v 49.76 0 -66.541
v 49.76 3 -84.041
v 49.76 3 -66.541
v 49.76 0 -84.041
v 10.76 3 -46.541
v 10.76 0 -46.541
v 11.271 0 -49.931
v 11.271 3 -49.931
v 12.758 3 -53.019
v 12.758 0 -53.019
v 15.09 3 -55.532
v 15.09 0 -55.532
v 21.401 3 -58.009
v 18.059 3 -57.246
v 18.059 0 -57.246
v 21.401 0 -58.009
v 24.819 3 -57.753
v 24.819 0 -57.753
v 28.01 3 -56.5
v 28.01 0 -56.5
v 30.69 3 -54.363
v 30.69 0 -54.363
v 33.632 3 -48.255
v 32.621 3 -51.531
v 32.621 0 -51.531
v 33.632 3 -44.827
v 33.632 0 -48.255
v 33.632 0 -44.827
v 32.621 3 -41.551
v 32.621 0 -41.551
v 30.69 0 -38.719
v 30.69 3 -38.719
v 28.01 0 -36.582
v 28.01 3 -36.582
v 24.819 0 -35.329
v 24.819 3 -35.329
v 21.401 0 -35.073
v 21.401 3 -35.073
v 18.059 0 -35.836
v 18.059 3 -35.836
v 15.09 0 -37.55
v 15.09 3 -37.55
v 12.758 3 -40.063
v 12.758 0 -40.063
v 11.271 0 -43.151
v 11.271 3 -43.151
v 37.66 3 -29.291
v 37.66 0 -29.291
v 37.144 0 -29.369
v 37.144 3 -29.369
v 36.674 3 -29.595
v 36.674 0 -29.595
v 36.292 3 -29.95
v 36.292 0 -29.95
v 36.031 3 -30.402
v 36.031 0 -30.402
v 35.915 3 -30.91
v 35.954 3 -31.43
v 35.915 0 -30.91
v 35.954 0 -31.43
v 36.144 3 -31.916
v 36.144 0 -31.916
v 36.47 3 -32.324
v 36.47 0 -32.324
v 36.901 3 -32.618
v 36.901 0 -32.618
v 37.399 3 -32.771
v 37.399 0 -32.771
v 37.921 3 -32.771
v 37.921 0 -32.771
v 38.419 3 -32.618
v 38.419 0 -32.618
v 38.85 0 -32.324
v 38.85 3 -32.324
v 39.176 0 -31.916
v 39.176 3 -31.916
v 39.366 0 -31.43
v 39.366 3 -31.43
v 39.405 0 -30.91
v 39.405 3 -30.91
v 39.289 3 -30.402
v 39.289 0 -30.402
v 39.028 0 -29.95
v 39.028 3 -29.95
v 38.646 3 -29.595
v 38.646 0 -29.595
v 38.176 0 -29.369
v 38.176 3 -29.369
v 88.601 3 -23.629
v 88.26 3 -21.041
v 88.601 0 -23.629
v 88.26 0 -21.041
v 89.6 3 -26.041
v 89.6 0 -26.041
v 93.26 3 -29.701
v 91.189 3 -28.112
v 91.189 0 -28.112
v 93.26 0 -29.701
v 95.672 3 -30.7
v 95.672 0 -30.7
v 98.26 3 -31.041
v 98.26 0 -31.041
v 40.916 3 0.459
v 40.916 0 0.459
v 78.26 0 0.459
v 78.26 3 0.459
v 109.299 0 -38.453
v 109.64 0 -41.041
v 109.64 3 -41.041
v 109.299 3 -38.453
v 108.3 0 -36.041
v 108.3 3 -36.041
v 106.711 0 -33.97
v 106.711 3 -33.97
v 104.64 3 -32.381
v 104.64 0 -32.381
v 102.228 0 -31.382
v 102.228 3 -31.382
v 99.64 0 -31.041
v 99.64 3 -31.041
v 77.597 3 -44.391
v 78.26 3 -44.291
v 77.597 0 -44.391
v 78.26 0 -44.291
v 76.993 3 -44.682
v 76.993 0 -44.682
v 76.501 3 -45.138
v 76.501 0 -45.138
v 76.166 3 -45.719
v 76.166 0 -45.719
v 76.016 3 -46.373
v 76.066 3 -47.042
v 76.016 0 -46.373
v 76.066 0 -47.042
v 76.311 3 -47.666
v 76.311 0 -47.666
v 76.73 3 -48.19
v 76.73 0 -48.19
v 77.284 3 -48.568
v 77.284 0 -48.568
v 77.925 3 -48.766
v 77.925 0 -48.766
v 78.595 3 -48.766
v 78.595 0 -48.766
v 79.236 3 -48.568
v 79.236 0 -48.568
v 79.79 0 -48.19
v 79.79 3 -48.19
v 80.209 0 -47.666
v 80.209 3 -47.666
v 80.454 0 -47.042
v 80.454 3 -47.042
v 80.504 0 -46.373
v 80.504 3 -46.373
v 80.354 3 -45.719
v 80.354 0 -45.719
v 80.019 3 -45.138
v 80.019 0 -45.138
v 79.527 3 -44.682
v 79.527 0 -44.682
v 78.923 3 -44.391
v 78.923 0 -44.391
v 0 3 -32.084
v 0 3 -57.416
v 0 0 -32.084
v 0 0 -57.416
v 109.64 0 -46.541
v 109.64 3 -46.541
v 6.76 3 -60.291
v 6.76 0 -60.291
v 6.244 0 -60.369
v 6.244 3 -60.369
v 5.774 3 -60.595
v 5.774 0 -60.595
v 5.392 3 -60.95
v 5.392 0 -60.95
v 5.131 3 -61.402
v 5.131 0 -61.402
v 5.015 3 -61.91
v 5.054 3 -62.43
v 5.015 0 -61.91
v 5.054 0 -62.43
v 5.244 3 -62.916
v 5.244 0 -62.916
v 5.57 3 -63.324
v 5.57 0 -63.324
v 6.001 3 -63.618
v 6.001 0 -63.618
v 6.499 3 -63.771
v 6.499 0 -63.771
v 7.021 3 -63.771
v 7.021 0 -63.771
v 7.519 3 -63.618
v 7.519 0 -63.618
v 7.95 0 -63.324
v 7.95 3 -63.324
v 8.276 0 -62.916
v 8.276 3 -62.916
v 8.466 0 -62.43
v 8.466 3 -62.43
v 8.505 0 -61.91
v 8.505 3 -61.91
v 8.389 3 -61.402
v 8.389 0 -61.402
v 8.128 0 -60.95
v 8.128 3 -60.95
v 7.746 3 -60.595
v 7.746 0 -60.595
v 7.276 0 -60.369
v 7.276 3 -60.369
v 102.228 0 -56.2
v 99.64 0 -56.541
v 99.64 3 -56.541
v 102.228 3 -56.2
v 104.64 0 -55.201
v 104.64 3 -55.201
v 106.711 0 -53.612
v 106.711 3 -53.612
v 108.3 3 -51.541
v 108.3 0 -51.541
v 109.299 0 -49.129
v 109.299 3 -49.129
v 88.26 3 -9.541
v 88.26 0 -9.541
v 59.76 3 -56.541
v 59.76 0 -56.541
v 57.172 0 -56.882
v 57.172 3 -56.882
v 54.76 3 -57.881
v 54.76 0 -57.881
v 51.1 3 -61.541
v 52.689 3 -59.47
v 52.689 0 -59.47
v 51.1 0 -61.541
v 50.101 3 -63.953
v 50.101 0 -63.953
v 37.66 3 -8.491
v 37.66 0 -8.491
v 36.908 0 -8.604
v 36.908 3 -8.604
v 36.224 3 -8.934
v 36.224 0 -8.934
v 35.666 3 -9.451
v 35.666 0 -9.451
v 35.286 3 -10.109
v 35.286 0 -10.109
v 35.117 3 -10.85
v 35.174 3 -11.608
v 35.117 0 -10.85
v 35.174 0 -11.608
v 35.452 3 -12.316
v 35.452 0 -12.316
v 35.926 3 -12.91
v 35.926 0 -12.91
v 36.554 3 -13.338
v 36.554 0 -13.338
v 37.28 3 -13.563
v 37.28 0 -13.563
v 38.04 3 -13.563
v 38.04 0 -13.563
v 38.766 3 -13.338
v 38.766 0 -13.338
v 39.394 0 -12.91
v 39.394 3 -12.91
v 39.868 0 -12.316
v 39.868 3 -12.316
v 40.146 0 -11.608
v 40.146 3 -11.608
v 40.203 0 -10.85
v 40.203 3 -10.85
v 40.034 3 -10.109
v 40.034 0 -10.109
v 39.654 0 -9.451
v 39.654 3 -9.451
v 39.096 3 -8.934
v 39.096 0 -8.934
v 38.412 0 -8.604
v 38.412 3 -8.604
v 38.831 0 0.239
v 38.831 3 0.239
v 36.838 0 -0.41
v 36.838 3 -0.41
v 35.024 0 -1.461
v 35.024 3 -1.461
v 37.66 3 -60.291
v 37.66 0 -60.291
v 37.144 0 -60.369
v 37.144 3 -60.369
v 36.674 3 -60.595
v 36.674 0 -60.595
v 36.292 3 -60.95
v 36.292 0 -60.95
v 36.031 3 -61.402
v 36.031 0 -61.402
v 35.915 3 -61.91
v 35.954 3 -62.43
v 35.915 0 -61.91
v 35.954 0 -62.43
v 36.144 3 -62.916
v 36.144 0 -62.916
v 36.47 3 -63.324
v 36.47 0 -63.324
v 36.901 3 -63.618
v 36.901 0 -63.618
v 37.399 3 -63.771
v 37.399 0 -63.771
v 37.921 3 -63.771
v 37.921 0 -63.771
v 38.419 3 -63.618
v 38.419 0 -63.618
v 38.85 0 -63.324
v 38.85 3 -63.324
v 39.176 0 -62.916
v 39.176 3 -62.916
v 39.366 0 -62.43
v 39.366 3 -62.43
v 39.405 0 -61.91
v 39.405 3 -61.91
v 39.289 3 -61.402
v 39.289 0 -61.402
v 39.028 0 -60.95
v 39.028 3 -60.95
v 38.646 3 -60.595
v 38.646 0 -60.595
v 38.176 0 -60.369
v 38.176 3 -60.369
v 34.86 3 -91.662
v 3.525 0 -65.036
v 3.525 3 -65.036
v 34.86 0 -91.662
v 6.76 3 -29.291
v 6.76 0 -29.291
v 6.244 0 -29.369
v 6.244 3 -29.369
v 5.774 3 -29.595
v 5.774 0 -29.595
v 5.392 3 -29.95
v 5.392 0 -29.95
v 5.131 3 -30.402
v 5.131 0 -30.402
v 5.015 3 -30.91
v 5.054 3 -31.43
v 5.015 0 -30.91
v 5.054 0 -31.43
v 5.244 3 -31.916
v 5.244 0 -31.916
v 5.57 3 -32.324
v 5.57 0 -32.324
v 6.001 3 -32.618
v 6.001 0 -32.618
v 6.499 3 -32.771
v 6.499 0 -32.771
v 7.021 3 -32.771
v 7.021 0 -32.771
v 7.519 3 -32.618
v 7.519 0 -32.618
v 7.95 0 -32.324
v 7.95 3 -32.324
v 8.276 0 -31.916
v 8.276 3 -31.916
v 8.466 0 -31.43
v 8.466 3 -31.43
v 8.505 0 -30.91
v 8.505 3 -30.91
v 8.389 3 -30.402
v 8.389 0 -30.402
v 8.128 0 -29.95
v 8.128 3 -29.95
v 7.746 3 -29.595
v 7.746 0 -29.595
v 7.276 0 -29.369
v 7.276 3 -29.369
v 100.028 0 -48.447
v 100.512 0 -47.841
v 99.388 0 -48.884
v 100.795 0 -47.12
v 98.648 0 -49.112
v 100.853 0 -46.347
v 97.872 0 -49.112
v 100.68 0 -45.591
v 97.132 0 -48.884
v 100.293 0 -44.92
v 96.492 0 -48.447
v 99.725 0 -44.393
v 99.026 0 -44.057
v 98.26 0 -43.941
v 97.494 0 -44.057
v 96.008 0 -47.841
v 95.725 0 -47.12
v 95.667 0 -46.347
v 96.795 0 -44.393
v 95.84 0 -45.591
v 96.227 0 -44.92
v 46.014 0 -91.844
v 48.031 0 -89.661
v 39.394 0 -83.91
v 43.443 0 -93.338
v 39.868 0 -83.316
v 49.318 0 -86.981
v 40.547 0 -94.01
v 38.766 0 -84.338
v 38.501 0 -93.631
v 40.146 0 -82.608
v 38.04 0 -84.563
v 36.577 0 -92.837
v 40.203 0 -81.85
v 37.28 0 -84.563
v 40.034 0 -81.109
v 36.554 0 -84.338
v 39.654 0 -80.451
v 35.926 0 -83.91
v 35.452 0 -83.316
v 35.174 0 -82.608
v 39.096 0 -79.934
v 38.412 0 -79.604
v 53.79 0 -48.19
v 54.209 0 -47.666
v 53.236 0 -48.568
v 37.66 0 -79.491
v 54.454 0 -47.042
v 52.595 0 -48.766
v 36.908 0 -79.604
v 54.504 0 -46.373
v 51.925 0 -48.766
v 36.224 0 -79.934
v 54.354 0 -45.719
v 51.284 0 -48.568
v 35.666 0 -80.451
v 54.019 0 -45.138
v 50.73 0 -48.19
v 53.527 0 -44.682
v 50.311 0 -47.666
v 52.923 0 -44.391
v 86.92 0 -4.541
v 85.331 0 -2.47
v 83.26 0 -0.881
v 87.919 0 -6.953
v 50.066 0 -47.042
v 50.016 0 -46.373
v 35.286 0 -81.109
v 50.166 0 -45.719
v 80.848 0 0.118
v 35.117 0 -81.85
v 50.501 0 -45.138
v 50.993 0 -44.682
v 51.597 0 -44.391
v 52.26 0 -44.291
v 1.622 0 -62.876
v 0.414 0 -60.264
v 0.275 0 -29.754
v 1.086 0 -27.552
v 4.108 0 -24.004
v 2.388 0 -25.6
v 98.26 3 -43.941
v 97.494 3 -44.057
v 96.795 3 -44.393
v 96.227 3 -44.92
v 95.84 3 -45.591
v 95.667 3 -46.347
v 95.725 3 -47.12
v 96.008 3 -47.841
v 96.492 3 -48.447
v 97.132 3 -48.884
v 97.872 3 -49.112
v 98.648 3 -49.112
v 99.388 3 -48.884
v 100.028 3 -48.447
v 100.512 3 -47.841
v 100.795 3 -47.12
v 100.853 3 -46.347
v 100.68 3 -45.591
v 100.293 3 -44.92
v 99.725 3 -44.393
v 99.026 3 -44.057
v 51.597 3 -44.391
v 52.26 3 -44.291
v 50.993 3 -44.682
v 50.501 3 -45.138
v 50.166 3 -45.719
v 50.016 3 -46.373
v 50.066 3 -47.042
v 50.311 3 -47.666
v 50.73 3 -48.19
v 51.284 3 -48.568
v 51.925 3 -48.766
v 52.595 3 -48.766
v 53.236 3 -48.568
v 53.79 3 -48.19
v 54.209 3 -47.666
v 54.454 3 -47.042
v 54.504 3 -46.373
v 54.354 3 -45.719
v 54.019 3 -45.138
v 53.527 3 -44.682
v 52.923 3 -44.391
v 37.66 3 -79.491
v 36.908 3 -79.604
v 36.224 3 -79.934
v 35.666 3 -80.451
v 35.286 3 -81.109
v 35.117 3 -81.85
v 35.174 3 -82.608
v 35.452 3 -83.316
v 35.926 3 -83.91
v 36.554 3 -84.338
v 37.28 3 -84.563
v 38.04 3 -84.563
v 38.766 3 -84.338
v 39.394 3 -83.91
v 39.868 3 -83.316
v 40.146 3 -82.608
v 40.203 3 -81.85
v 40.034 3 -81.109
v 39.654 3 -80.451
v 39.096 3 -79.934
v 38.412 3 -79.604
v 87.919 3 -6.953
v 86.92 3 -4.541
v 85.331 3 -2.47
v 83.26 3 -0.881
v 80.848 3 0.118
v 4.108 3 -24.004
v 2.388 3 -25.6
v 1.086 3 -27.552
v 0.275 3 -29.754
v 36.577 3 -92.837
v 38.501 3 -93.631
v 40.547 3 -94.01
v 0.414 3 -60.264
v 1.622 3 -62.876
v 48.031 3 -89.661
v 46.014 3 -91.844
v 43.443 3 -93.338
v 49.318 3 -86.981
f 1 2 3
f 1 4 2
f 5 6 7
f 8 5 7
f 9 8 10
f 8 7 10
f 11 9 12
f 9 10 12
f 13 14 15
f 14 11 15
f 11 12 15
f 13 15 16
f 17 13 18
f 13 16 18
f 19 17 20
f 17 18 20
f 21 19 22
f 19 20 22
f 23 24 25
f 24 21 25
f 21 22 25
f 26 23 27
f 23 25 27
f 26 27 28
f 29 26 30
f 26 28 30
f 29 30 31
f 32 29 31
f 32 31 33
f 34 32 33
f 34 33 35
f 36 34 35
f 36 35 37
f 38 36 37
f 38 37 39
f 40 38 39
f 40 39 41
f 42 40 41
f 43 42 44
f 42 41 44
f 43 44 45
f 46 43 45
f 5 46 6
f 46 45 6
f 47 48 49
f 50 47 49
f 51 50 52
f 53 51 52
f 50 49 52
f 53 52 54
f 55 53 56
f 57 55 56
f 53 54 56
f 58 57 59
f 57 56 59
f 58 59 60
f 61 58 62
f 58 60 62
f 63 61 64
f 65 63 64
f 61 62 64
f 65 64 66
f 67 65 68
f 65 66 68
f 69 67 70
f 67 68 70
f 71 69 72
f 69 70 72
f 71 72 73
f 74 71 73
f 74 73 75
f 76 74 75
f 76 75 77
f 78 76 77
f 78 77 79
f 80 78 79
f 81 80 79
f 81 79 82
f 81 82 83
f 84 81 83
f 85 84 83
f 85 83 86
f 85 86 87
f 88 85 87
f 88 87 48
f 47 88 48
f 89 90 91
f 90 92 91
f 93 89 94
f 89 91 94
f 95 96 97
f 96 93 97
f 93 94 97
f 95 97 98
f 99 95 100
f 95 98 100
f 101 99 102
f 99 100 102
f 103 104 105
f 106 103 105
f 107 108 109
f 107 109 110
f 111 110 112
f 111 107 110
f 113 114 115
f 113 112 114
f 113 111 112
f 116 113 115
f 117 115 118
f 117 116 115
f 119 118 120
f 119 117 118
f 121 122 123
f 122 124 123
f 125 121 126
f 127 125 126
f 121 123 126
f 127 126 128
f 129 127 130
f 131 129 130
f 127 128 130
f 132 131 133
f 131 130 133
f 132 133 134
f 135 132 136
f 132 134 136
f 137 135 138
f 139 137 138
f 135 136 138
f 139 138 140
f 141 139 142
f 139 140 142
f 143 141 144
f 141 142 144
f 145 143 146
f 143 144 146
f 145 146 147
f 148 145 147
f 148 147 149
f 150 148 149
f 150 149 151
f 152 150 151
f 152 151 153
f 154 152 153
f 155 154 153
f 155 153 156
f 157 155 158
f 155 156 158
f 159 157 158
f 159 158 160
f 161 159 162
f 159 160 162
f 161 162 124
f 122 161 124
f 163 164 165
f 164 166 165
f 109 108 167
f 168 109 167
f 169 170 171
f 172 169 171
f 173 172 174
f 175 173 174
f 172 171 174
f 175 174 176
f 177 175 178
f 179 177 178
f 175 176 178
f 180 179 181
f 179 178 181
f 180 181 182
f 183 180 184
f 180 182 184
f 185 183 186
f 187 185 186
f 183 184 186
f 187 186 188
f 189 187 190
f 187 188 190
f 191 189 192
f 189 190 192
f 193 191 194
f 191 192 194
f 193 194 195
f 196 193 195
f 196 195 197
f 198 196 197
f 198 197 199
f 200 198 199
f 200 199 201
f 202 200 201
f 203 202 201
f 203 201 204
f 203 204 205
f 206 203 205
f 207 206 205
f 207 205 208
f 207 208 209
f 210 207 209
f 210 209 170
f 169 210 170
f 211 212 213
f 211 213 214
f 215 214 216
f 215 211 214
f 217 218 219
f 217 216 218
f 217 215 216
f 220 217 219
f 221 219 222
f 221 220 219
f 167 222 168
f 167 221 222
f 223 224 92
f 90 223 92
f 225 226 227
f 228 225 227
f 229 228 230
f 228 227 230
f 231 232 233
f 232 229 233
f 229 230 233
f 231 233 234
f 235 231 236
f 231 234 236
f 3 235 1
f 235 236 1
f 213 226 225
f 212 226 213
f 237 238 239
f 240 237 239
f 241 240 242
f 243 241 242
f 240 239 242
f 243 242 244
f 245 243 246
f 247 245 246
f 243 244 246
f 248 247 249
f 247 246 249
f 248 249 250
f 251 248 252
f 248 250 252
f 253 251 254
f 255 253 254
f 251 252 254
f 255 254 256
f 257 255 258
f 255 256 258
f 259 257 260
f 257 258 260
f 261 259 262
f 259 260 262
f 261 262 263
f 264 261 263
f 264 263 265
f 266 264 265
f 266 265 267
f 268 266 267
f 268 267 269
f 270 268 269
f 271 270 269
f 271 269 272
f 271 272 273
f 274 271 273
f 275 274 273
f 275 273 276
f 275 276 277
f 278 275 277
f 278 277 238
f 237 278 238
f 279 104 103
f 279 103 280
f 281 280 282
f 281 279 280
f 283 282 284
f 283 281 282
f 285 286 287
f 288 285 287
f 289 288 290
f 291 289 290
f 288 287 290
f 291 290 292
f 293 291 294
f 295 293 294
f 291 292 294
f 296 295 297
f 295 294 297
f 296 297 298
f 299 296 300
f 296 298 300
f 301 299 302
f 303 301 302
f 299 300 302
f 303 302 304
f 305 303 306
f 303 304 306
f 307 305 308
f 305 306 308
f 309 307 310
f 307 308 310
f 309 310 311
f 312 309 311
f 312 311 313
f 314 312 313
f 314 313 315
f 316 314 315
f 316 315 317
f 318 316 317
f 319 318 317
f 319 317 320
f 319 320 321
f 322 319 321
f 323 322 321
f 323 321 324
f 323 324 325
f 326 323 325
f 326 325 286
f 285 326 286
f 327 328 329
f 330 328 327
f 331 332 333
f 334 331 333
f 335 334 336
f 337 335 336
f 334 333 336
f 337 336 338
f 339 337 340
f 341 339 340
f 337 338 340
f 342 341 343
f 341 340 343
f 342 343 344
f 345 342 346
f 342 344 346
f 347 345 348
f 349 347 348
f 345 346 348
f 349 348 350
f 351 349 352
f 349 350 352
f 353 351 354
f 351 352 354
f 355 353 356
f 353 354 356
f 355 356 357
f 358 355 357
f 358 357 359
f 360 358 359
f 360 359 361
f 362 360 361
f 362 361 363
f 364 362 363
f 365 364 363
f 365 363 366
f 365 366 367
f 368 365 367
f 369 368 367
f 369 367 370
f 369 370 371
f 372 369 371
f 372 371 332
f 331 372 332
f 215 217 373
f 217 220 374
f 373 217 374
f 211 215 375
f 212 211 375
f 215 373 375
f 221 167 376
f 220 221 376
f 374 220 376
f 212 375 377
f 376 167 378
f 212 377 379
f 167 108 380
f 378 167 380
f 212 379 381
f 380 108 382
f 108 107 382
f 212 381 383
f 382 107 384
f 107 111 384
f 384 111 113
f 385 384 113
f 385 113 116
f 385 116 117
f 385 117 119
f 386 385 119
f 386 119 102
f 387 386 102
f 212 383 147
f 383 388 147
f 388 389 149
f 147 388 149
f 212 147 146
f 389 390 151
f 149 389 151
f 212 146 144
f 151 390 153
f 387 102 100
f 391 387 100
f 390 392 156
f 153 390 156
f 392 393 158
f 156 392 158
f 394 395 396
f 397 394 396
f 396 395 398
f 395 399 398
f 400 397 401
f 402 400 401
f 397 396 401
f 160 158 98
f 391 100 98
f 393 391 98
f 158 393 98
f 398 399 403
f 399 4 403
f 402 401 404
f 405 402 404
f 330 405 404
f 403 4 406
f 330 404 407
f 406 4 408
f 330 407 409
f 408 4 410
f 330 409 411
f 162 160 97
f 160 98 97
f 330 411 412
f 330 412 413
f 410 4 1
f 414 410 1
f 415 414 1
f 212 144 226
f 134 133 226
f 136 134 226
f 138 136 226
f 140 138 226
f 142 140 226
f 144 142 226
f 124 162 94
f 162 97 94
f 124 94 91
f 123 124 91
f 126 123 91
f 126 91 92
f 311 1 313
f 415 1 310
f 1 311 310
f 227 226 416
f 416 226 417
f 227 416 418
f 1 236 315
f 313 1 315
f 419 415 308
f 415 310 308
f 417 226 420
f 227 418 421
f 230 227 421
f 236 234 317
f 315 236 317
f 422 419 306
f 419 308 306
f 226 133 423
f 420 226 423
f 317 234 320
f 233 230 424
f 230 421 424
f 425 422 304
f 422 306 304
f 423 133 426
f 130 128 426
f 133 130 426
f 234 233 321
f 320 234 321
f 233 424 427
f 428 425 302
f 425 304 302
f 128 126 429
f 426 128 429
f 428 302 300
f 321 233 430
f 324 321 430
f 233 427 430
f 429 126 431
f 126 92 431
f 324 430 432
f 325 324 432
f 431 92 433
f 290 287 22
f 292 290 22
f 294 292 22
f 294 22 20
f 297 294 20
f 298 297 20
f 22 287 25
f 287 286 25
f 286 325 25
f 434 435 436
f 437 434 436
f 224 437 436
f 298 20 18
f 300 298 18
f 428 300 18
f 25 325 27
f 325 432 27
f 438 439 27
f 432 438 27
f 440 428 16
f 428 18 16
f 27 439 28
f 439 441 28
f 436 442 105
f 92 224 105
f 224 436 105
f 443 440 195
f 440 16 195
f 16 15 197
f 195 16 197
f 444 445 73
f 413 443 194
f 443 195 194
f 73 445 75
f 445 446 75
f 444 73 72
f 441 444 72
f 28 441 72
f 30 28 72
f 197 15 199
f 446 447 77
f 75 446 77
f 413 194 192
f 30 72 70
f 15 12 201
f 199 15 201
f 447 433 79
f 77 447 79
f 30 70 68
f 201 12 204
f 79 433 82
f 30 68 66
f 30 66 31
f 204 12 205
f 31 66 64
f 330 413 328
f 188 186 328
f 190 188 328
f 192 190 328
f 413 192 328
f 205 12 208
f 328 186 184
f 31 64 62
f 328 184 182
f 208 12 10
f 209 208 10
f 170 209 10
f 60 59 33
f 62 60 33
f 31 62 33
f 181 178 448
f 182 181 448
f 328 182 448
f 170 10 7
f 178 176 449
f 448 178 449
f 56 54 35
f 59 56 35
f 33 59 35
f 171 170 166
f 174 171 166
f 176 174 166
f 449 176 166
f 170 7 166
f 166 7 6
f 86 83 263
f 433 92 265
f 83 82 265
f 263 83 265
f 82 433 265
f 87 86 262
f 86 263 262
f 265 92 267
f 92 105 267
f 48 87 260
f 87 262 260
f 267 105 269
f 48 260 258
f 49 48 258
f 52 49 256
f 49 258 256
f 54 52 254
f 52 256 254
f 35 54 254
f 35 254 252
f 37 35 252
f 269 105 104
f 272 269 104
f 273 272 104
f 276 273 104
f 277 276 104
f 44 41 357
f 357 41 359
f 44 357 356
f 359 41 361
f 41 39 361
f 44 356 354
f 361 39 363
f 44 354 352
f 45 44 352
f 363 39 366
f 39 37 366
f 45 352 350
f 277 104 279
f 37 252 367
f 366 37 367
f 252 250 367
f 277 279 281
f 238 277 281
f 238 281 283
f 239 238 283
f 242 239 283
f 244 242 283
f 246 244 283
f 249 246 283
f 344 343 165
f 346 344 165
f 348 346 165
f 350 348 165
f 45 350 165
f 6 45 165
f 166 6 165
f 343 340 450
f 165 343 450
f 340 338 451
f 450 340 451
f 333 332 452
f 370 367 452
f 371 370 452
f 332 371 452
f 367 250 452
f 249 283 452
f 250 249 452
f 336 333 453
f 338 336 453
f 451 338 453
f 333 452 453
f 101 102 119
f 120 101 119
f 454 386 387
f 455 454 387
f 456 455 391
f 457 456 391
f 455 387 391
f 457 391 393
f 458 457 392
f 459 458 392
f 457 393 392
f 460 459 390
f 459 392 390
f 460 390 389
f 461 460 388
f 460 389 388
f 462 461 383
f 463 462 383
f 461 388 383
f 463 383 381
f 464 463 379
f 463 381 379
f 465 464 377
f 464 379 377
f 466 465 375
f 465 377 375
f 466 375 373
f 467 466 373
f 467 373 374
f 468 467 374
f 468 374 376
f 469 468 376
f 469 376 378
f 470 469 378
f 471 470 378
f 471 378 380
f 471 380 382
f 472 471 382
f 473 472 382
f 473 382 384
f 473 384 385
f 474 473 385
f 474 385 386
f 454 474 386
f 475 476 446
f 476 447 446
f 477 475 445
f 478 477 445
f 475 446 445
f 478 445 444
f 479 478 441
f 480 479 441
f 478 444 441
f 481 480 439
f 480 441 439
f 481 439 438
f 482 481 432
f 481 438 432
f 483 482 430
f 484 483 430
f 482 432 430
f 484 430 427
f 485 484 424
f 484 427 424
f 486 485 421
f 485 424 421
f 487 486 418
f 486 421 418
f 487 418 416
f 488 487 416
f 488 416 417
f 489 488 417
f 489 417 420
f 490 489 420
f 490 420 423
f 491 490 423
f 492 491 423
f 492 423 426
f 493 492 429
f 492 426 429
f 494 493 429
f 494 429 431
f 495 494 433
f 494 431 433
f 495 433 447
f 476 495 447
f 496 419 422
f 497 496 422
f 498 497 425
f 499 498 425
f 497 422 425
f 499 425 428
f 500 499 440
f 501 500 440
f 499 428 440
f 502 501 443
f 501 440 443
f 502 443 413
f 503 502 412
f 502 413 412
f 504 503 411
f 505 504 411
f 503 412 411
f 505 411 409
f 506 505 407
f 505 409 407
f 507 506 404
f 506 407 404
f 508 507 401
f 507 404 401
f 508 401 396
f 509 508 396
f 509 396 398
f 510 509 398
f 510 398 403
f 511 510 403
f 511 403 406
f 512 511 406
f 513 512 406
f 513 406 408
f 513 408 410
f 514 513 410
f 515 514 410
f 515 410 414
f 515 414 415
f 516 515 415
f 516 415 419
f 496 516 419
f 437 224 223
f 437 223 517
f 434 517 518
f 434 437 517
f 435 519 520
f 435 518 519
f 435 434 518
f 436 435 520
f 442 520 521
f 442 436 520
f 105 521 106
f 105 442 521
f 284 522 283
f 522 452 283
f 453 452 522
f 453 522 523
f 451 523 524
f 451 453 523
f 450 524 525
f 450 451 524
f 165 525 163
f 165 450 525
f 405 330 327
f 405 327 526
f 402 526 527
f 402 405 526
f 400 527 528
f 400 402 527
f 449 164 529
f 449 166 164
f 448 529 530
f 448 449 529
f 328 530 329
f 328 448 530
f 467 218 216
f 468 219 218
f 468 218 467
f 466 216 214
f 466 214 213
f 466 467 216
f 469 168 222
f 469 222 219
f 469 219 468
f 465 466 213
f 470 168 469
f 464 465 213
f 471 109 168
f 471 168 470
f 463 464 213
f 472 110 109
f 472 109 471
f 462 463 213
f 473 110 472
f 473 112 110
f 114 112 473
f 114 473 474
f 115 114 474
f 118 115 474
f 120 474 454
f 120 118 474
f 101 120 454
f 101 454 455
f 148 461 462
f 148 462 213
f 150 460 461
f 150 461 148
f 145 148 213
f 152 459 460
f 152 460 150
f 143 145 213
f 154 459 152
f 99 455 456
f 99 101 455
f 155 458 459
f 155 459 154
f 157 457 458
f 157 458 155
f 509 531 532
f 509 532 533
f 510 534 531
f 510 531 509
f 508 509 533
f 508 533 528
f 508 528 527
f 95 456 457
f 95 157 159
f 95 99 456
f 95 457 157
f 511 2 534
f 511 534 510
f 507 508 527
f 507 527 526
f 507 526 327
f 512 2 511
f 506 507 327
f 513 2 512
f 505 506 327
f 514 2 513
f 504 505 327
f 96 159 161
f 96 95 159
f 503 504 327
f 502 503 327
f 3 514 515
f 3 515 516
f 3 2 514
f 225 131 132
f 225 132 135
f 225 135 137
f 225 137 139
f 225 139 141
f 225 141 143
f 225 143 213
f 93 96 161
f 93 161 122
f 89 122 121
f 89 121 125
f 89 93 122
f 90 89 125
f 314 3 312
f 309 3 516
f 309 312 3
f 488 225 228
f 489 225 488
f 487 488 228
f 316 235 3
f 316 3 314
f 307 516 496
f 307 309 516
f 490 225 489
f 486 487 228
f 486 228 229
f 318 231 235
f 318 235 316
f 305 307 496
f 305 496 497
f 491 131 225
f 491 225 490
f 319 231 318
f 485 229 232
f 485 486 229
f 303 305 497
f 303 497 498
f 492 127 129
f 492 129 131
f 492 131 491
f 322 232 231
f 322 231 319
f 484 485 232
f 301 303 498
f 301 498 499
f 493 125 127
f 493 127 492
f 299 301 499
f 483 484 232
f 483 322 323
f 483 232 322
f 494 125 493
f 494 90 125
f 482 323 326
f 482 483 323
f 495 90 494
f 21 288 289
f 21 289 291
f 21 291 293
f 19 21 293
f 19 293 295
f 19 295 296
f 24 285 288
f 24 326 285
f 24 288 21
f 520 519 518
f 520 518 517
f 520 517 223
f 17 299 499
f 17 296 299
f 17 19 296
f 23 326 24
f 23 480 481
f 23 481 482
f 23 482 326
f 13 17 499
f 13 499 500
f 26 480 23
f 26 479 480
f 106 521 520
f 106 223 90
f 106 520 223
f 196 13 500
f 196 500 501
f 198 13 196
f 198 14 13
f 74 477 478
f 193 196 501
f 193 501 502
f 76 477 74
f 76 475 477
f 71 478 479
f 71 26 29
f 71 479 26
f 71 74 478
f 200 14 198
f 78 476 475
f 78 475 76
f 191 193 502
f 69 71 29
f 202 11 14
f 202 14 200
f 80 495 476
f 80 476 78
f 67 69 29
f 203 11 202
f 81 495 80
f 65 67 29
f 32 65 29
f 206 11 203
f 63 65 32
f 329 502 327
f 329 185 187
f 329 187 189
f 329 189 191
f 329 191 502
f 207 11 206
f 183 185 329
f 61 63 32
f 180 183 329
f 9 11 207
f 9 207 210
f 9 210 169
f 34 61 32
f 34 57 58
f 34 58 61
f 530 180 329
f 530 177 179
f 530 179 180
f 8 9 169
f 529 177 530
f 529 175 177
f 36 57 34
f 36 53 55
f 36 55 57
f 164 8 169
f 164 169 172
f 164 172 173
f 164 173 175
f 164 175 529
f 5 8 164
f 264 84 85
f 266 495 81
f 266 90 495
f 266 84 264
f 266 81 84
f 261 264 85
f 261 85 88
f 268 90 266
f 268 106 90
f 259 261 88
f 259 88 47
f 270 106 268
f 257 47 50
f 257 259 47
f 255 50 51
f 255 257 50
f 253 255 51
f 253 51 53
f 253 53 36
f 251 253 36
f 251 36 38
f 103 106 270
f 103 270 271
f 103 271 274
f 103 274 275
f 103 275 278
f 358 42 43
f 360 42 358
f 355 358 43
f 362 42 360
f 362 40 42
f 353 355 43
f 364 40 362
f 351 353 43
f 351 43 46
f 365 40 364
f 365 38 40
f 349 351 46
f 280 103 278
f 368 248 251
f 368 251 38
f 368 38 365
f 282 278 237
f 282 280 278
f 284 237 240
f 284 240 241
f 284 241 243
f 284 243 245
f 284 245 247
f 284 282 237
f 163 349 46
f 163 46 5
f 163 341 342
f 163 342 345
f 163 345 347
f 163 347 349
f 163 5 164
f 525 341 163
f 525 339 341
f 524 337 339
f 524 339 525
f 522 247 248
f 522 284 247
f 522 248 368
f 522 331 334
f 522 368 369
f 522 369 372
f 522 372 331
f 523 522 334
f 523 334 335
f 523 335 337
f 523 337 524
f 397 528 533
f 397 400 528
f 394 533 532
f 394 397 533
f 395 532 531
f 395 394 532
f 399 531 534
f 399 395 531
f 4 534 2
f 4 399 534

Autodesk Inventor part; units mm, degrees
ref_plane "YZ Plane" through (0, 0, 0) normal (1, 0, 0) x (0, 1, 0)
ref_plane "XZ Plane" through (0, 0, 0) normal (0, 1, 0) x (-1, 0, 0)
ref_plane "XY Plane" through (0, 0, 0) normal (0, 0, 1) x (1, 0, 0)
sketch "Sketch1" plane through (0, 0, 0) normal (0, 1, 0) x (-1, 0, 0)
  line L0 (-40.9159, 0.459) -> (-78.26, 0.459)
  line L1 (-109.64, -41.041) -> (-109.64, -46.541)
  line L2 (-39.76, -94.041) -> (-41.3348, -94.041)
  line L3 (0, -57.4156) -> (0, -32.0844)
  circle A0 centre (-22.26, -46.541) radius 11.5
  line L4 (-3.5248, -65.0361) -> (-34.8596, -91.6615)
  line L5 (-4.1082, -24.0044) -> (-35.0241, -1.461)
  line L6 (-49.76, -84.041) -> (-49.76, -66.541)
  line L7 (-59.76, -56.541) -> (-99.64, -56.541)
  line L8 (-98.26, -31.041) -> (-99.64, -31.041)
  line L9 (-88.26, -9.541) -> (-88.26, -21.041)
  arc A1 (-3.5248, -65.0361) -> (0, -57.4156) centre (-10, -57.4156) ccw
  arc A2 (0, -32.0844) -> (-4.1082, -24.0044) centre (-10, -32.0844) ccw
  arc A3 (-35.0241, -1.461) -> (-40.9159, 0.459) centre (-40.9159, -9.541) ccw
  arc A4 (-78.26, 0.459) -> (-88.26, -9.541) centre (-78.26, -9.541) ccw
  arc A5 (-98.26, -31.041) -> (-88.26, -21.041) centre (-98.26, -21.041) ccw
  arc A6 (-99.64, -31.041) -> (-109.64, -41.041) centre (-99.64, -41.041) ccw
  arc A7 (-109.64, -46.541) -> (-99.64, -56.541) centre (-99.64, -46.541) ccw
  arc A8 (-49.76, -66.541) -> (-59.76, -56.541) centre (-59.76, -66.541) ccw
  arc A9 (-49.76, -84.041) -> (-39.76, -94.041) centre (-39.76, -84.041) ccw
  arc A10 (-41.3348, -94.041) -> (-34.8596, -91.6615) centre (-41.3348, -84.041) ccw
  point P0 (0, 0)
  point P1 (0, -62.041)
  point P2 (-37.66, -94.041)
  point P3 (0, -27)
  point P4 (-37.6572, 0.459)
  point P5 (0, -44.75)
  point P6 (-40.5474, -94.01)
  dimension "d0" = 94.5
  dimension "d1" = 109.64
  dimension "d2" = 23
  dimension "d3" = 47
  dimension "d4" = 22.26
  dimension "d5" = 37.66
  dimension "d6" = 32
  dimension "d7" = 37.66
  dimension "d8" = 27
  dimension "d11" = 57
  dimension "d12" = 49.76
  dimension "d15" = 25.5
  dimension "d16" = 88.26
  dimension "d17" = 10
extrude "Extrusion1" add sketch "Sketch1" along normal blind 3 contours A3 L5 A2 L3 A1 L4 A10 A9 L6 A8 L7 A7 L1 A6 L8 A5 L9 A4 L0
sketch "Sketch2" plane through (0, 3, 0) normal (0, 1, 0) x (1, 0, 0)
  line L0 (40.9159, -0.459) -> (78.26, -0.459) projected
  line L1 (0, 57.4156) -> (0, 32.0844) projected
  point P0 (0, 0)
  point P1 (6.76, 62.041)
  point P2 (37.66, 62.041)
  point P3 (37.66, 31.041)
  point P4 (6.76, 31.041)
  dimension "d20" = 31.5
  dimension "d21" = 37.66
  dimension "d22" = 62.5
  dimension "d23" = 6.76
hole "Hole1" at (6.76, 3, -62.041) at (37.66, 3, -62.041) at (37.66, 3, -31.041) at (6.76, 3, -31.041) direction (0, -1, 0) diameter 3.5 end through all
sketch "Sketch3" plane through (0, 3, 0) normal (0, 1, 0) x (1, 0, 0)
  line L0 (40.9159, -0.459) -> (78.26, -0.459) projected
  line L1 (0, 57.4156) -> (0, 32.0844) projected
  point P0 (0, 0)
  point P1 (37.66, 82.041)
  point P2 (37.66, 11.041)
  dimension "d31" = 82.5
  dimension "d32" = 11.5
  dimension "d33" = 37.66
hole "Hole2" at (37.66, 3, -82.041) at (37.66, 3, -11.041) direction (0, -1, 0) diameter 5.1 end through all
sketch "Sketch4" plane through (0, 3, 0) normal (0, 1, 0) x (1, 0, 0)
  line L0 (40.9159, -0.459) -> (78.26, -0.459) projected
  line L1 (0, 57.4156) -> (0, 32.0844) projected
  point P0 (0, 0)
  point P1 (52.26, 46.541)
  point P2 (78.26, 46.541)
  dimension "d41" = 47
  dimension "d42" = 52.26
  dimension "d43" = 78.26
hole "Hole3" at (52.26, 3, -46.541) at (78.26, 3, -46.541) direction (0, -1, 0) diameter 4.5 end through all
sketch "Sketch5" plane through (0, 3, 0) normal (0, 1, 0) x (1, 0, 0)
  line L0 (0, 57.4156) -> (0, 32.0844) projected
  line L1 (40.9159, -0.459) -> (78.26, -0.459) projected
  point P0 (0, 0)
  point P1 (98.26, 46.541)
  dimension "d51" = 98.26
  dimension "d52" = 47
hole "Hole4" at (98.26, 3, -46.541) direction (0, -1, 0) diameter 5.2 end through all
properties part number "X Motor Bracket" material "Aluminum 6061"
